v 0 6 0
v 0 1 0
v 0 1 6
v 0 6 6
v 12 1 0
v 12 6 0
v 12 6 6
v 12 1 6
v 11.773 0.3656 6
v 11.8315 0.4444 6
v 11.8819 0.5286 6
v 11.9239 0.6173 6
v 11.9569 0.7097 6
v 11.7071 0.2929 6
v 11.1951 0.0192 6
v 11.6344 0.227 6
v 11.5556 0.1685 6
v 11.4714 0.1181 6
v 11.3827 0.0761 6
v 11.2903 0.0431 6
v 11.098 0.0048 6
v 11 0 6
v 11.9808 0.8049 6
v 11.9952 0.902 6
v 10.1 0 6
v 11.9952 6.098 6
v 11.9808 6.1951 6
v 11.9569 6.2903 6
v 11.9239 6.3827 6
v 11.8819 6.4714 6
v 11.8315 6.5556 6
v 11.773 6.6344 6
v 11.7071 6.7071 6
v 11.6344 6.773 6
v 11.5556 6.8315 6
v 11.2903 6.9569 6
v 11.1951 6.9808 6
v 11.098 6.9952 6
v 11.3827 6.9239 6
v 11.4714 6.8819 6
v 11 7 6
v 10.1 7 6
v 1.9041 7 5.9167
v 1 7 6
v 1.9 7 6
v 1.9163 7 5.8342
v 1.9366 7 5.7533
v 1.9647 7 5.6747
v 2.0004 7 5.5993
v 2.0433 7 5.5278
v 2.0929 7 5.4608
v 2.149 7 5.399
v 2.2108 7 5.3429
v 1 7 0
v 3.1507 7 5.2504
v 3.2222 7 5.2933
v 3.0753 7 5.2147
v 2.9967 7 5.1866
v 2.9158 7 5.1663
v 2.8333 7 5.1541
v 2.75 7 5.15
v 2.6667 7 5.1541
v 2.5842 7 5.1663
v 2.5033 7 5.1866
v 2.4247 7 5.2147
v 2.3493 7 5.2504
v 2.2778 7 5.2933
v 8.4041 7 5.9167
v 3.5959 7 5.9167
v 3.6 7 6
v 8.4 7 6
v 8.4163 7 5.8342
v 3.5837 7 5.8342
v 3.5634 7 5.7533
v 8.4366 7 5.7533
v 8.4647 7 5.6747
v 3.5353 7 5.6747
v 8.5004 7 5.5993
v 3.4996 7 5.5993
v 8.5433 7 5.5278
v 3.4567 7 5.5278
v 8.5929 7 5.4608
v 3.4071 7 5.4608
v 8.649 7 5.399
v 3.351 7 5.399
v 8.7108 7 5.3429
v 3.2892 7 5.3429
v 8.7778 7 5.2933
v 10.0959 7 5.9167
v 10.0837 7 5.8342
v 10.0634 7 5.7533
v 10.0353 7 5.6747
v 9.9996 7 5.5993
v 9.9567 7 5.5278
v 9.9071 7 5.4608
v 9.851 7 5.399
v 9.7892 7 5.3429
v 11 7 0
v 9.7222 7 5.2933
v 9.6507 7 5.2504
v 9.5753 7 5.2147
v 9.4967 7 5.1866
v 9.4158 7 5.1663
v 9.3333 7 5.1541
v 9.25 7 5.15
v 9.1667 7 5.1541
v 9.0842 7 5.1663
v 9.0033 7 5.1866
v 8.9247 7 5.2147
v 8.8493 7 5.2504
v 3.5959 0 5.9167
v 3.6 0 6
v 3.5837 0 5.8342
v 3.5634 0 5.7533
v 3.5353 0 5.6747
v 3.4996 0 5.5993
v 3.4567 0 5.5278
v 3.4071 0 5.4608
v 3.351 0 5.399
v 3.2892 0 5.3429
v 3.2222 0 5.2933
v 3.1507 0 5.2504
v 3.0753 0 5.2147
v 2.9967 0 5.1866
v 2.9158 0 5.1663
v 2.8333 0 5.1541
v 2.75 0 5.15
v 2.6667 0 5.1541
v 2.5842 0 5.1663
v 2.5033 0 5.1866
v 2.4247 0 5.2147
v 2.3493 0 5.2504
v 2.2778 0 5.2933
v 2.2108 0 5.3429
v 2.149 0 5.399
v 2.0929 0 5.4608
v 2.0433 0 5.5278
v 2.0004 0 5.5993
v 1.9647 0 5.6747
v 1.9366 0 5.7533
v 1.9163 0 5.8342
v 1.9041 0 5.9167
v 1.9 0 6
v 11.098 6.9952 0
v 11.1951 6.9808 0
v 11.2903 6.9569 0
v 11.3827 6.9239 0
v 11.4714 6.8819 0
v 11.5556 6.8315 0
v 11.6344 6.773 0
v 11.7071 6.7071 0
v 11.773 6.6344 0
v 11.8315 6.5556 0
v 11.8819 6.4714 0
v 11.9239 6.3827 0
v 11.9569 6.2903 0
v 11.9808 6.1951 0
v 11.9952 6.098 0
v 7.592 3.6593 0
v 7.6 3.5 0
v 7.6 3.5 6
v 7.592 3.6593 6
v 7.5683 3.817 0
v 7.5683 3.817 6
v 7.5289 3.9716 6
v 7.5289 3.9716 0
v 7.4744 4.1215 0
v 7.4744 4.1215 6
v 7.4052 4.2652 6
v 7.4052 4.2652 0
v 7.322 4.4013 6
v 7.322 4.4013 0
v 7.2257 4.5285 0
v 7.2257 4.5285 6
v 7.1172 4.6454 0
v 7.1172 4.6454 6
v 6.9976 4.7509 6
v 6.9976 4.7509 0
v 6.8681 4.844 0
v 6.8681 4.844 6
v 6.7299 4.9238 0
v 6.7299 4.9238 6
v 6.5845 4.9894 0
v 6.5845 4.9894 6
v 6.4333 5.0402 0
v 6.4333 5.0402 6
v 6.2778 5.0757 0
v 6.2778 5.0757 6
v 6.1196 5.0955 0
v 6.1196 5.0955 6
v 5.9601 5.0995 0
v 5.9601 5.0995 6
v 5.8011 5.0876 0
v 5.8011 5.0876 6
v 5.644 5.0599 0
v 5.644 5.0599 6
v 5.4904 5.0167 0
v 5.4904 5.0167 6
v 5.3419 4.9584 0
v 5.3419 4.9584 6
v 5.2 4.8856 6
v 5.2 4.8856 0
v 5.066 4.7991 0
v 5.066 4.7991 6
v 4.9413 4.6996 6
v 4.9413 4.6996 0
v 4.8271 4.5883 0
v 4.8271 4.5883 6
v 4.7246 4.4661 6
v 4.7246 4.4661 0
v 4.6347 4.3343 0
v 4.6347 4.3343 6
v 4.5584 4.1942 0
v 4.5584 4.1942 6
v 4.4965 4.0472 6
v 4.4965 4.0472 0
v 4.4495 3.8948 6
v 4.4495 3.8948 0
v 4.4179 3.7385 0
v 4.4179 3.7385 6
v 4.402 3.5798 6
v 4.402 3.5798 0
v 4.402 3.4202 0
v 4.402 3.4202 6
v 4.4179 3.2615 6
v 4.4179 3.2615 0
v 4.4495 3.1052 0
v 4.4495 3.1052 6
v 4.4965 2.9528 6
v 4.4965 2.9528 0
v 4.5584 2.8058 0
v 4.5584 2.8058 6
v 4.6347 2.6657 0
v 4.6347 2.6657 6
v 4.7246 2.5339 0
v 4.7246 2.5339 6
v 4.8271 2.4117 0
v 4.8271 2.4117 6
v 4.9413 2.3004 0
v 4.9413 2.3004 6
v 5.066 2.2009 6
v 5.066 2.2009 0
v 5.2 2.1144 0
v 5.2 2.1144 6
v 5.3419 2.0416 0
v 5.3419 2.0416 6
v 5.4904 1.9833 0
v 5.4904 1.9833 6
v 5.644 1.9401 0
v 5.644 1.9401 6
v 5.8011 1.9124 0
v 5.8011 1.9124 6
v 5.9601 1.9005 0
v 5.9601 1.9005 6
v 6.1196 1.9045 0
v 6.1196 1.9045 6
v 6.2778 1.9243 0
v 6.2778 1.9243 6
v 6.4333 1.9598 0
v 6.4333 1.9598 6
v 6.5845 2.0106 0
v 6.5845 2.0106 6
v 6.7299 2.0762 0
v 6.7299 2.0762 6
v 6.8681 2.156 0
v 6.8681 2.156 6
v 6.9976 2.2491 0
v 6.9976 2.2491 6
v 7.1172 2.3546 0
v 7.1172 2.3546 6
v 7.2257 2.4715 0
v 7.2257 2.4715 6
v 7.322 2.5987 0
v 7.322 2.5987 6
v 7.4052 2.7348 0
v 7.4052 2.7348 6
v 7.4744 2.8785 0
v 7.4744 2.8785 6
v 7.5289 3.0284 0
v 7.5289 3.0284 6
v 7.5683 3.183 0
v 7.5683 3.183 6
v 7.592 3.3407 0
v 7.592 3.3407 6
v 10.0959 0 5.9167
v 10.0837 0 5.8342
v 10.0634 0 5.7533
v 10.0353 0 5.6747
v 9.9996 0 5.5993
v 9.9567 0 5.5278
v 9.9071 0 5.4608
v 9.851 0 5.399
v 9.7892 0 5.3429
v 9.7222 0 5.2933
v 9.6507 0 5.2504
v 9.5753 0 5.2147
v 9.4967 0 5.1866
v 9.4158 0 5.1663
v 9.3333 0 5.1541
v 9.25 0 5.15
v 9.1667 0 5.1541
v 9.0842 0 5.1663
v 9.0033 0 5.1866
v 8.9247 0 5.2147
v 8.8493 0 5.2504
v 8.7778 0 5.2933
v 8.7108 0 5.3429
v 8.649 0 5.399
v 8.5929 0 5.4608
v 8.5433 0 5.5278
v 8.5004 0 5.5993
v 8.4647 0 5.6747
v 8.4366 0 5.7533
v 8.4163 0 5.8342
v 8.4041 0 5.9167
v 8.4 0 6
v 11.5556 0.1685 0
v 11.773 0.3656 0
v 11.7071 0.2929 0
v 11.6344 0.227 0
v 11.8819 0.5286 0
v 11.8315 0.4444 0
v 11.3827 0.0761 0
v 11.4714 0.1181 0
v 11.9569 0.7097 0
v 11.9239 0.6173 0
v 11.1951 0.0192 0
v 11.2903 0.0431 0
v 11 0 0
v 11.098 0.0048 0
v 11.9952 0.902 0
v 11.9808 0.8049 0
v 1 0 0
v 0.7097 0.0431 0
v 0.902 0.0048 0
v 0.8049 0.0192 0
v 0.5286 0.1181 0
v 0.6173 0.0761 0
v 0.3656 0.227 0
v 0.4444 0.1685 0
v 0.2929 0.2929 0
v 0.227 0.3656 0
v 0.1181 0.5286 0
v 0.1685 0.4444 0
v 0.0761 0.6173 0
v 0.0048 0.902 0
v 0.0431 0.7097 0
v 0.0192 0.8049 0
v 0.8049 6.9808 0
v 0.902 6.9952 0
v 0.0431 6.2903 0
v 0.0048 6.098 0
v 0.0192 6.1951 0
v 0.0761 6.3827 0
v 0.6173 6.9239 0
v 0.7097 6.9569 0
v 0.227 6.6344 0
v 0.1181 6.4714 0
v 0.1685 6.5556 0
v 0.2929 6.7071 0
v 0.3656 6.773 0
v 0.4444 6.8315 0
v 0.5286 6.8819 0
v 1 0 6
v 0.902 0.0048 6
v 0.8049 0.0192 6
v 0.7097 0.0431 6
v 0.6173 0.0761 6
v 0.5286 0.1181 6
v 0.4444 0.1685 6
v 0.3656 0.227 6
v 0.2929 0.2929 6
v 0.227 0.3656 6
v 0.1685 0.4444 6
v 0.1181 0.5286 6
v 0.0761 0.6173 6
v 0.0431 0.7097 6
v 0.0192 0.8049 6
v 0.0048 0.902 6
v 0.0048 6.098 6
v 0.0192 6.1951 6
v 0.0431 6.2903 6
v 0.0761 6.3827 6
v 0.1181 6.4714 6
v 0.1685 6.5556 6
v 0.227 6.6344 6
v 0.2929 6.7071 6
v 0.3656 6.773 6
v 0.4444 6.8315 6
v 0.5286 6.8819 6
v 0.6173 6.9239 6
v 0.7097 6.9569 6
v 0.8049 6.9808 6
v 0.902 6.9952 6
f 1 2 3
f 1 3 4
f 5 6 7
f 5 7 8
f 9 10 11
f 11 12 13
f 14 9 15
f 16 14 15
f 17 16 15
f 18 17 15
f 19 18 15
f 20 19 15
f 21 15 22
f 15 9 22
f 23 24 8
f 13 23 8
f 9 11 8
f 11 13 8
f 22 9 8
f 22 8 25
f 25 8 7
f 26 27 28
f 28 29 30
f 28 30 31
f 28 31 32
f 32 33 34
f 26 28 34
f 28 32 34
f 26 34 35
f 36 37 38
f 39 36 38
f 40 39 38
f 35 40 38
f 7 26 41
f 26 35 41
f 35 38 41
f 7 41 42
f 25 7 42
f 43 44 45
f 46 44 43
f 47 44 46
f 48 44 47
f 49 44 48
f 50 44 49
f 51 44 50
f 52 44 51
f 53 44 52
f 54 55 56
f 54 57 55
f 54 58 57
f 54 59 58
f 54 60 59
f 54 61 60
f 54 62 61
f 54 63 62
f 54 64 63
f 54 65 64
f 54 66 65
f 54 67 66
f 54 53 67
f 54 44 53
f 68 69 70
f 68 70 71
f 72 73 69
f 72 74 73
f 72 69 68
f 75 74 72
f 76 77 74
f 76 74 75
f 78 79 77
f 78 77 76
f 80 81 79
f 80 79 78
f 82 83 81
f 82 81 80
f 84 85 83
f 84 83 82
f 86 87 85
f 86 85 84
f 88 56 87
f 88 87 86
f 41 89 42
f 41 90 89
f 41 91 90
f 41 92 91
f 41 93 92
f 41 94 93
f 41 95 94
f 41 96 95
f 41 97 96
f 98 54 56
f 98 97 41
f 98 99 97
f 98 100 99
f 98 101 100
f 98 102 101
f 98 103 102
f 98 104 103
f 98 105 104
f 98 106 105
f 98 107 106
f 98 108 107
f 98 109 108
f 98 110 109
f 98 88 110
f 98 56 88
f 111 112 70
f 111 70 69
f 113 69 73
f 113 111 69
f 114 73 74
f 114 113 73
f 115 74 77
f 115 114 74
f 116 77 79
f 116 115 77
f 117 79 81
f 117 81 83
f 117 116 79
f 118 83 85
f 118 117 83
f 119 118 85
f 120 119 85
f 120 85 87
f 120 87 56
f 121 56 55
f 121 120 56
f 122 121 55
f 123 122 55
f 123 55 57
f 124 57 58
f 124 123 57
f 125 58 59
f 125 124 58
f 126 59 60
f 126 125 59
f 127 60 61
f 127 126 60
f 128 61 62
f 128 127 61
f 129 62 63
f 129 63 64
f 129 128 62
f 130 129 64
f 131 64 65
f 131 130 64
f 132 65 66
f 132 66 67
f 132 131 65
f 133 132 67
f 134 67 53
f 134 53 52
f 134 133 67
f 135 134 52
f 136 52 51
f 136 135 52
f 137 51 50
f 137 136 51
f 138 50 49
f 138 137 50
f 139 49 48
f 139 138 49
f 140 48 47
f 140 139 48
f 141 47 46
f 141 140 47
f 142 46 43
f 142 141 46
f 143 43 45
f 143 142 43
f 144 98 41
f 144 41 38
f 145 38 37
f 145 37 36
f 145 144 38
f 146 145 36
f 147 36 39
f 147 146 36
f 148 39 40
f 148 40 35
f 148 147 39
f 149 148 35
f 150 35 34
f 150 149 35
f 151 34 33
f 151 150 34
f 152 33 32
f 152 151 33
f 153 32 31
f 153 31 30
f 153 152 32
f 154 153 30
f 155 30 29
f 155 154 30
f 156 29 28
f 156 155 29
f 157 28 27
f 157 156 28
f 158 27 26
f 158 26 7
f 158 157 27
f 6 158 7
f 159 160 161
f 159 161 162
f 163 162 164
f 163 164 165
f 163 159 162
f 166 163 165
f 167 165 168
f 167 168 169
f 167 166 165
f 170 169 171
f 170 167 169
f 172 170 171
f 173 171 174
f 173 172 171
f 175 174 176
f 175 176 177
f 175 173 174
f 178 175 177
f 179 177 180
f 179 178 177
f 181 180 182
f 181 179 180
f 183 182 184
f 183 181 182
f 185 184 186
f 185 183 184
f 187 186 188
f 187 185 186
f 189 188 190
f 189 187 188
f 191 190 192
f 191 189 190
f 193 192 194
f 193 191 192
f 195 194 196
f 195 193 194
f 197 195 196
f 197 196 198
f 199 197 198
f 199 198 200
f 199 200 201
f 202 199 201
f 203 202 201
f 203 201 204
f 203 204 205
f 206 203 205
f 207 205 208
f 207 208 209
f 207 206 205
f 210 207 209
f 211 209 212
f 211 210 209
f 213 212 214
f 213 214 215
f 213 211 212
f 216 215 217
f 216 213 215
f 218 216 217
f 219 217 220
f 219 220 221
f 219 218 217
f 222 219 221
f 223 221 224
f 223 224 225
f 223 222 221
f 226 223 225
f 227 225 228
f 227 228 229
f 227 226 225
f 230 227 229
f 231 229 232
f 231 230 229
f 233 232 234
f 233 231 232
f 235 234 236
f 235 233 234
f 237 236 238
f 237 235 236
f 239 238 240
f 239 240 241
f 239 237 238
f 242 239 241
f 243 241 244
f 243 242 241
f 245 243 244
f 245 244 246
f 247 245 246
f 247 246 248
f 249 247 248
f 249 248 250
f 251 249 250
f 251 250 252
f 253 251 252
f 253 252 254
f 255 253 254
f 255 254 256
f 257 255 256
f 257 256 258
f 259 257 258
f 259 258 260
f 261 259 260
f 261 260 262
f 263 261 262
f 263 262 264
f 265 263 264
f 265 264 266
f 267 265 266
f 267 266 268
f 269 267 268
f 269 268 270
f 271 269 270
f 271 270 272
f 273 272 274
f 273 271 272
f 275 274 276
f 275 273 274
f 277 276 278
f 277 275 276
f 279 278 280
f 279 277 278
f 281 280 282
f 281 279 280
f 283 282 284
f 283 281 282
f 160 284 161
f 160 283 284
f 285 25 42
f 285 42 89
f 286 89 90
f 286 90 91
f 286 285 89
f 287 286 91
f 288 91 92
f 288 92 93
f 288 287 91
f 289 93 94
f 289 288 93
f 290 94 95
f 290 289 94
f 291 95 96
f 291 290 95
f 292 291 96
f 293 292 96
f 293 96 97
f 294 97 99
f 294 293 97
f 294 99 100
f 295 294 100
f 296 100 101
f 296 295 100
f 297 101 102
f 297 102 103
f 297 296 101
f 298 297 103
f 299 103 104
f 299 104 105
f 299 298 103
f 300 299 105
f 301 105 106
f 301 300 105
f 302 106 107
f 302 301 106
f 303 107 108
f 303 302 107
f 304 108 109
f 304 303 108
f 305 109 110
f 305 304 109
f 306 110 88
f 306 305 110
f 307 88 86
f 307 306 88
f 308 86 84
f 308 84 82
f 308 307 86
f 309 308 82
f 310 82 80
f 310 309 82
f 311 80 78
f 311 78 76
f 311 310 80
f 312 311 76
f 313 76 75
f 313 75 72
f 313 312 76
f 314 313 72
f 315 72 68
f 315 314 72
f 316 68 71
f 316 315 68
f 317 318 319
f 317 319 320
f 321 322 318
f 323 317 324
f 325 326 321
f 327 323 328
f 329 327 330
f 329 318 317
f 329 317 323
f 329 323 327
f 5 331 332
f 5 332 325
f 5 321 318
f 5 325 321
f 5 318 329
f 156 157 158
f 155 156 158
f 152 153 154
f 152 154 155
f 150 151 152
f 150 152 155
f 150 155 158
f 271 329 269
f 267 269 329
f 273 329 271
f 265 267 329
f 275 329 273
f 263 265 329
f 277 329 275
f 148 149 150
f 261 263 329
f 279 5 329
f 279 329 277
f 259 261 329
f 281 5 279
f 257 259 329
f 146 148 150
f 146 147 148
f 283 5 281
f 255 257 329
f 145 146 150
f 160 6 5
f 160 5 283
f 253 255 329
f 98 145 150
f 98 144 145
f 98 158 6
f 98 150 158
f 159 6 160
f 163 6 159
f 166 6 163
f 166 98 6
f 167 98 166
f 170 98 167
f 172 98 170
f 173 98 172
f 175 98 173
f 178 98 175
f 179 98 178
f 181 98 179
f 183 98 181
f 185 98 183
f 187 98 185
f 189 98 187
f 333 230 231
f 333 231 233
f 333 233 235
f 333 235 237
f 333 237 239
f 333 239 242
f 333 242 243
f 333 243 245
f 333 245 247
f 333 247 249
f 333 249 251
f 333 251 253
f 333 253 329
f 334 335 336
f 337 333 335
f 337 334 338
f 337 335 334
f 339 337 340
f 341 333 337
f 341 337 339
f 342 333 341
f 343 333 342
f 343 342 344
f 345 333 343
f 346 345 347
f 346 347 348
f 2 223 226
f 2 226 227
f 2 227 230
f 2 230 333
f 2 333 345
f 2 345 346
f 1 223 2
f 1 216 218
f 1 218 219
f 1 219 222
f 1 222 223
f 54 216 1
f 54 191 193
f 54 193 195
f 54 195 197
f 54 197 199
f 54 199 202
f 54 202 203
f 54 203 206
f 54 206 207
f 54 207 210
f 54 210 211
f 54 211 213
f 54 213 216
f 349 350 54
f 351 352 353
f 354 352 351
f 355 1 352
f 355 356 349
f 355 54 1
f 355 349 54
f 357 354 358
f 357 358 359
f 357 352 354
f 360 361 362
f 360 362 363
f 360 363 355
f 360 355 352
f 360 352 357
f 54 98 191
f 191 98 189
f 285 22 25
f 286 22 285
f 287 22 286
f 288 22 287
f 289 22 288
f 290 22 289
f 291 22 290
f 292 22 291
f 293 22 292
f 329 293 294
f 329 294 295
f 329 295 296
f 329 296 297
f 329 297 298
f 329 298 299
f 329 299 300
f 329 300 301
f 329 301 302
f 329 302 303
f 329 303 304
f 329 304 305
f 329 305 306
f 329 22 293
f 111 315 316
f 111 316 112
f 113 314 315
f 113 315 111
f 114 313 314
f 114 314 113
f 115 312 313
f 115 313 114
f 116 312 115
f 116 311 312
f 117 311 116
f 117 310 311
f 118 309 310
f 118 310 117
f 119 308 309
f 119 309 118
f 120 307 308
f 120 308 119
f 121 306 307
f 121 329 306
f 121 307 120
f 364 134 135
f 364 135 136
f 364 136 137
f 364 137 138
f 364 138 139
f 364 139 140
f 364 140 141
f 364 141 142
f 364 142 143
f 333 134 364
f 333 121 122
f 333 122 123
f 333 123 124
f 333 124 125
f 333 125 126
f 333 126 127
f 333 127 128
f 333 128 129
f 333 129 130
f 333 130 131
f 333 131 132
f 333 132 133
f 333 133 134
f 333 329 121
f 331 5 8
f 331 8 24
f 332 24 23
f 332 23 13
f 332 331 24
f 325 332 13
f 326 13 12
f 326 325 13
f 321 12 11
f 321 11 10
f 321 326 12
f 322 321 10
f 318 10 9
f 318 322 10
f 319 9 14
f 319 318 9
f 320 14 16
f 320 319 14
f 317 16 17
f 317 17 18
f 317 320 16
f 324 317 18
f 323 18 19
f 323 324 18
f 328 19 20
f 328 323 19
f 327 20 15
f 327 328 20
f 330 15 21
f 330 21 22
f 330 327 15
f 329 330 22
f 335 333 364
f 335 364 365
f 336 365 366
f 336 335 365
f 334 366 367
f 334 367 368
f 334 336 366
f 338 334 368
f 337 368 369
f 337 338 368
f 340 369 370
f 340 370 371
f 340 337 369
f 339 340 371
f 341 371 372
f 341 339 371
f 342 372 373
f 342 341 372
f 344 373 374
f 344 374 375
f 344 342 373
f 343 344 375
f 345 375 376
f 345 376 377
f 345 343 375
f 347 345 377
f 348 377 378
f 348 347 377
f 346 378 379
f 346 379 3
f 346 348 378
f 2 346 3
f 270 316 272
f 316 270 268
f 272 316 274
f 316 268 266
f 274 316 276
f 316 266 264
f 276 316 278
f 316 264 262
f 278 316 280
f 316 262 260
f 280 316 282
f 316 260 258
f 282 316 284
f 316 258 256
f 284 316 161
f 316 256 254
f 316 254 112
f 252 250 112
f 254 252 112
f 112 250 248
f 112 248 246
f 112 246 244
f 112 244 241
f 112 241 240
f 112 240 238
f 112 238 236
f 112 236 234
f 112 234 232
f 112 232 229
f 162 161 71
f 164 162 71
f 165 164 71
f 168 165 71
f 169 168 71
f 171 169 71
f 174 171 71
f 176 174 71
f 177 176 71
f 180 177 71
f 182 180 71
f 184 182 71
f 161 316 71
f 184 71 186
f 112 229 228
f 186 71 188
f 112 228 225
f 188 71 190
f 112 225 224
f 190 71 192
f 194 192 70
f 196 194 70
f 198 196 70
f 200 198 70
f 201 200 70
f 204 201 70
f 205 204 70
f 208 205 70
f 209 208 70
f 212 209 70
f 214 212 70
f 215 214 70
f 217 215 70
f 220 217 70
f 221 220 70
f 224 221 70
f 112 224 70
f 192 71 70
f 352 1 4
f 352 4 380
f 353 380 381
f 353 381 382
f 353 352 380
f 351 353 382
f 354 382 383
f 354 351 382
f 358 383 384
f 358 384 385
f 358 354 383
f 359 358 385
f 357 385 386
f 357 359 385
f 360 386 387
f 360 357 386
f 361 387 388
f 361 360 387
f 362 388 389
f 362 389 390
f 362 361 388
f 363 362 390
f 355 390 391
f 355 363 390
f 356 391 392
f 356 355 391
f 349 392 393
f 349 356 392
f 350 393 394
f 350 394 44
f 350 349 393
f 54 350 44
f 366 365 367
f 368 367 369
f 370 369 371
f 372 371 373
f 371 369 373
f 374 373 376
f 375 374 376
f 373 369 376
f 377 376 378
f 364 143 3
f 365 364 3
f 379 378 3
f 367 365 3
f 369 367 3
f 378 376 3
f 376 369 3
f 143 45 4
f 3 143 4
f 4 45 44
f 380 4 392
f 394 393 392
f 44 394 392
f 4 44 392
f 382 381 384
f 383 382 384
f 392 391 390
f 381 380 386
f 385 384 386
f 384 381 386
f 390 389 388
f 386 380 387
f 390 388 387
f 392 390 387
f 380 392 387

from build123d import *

# Parameters (mm, degrees)
SKETCH1_R           = 1.6
BOSS_EXTRUDE1_DEPTH = 6
CUT_EXTRUDE1_DEPTH  = 7


with BuildPart() as part:
    # Sketch1 → Boss-Extrude1 (new body)
    with BuildSketch(Plane.XY):
        with BuildLine():
            Line((12, 6), (12, 1))
            ThreePointArc((12, 1), (11.707106781, 0.292893219), (11, 0))
            Line((11, 0), (1, 0))
            ThreePointArc((1, 0), (0.292893219, 0.292893219), (0, 1))
            Line((0, 1), (0, 6))
            ThreePointArc((0, 6), (0.292893219, 6.707106781), (1, 7))
            Line((1, 7), (11, 7))
            ThreePointArc((11, 7), (11.707106781, 6.707106781), (12, 6))
        make_face()
        with Locations((6, 3.5)):
            Circle(SKETCH1_R, mode=Mode.SUBTRACT)
    extrude(amount=BOSS_EXTRUDE1_DEPTH)

    # Sketch2 → Cut-Extrude1 (cut)
    with BuildSketch(Plane.XZ):
        with BuildLine():
            Line((1.9, 6), (3.6, 6))
            ThreePointArc((3.6, 6), (2.75, 5.15), (1.9, 6))
        make_face()
        with BuildLine():
            Line((8.4, 6), (10.1, 6))
            ThreePointArc((10.1, 6), (9.25, 5.15), (8.4, 6))
        make_face()
    extrude(amount=-CUT_EXTRUDE1_DEPTH, mode=Mode.SUBTRACT)


solid = part.part
